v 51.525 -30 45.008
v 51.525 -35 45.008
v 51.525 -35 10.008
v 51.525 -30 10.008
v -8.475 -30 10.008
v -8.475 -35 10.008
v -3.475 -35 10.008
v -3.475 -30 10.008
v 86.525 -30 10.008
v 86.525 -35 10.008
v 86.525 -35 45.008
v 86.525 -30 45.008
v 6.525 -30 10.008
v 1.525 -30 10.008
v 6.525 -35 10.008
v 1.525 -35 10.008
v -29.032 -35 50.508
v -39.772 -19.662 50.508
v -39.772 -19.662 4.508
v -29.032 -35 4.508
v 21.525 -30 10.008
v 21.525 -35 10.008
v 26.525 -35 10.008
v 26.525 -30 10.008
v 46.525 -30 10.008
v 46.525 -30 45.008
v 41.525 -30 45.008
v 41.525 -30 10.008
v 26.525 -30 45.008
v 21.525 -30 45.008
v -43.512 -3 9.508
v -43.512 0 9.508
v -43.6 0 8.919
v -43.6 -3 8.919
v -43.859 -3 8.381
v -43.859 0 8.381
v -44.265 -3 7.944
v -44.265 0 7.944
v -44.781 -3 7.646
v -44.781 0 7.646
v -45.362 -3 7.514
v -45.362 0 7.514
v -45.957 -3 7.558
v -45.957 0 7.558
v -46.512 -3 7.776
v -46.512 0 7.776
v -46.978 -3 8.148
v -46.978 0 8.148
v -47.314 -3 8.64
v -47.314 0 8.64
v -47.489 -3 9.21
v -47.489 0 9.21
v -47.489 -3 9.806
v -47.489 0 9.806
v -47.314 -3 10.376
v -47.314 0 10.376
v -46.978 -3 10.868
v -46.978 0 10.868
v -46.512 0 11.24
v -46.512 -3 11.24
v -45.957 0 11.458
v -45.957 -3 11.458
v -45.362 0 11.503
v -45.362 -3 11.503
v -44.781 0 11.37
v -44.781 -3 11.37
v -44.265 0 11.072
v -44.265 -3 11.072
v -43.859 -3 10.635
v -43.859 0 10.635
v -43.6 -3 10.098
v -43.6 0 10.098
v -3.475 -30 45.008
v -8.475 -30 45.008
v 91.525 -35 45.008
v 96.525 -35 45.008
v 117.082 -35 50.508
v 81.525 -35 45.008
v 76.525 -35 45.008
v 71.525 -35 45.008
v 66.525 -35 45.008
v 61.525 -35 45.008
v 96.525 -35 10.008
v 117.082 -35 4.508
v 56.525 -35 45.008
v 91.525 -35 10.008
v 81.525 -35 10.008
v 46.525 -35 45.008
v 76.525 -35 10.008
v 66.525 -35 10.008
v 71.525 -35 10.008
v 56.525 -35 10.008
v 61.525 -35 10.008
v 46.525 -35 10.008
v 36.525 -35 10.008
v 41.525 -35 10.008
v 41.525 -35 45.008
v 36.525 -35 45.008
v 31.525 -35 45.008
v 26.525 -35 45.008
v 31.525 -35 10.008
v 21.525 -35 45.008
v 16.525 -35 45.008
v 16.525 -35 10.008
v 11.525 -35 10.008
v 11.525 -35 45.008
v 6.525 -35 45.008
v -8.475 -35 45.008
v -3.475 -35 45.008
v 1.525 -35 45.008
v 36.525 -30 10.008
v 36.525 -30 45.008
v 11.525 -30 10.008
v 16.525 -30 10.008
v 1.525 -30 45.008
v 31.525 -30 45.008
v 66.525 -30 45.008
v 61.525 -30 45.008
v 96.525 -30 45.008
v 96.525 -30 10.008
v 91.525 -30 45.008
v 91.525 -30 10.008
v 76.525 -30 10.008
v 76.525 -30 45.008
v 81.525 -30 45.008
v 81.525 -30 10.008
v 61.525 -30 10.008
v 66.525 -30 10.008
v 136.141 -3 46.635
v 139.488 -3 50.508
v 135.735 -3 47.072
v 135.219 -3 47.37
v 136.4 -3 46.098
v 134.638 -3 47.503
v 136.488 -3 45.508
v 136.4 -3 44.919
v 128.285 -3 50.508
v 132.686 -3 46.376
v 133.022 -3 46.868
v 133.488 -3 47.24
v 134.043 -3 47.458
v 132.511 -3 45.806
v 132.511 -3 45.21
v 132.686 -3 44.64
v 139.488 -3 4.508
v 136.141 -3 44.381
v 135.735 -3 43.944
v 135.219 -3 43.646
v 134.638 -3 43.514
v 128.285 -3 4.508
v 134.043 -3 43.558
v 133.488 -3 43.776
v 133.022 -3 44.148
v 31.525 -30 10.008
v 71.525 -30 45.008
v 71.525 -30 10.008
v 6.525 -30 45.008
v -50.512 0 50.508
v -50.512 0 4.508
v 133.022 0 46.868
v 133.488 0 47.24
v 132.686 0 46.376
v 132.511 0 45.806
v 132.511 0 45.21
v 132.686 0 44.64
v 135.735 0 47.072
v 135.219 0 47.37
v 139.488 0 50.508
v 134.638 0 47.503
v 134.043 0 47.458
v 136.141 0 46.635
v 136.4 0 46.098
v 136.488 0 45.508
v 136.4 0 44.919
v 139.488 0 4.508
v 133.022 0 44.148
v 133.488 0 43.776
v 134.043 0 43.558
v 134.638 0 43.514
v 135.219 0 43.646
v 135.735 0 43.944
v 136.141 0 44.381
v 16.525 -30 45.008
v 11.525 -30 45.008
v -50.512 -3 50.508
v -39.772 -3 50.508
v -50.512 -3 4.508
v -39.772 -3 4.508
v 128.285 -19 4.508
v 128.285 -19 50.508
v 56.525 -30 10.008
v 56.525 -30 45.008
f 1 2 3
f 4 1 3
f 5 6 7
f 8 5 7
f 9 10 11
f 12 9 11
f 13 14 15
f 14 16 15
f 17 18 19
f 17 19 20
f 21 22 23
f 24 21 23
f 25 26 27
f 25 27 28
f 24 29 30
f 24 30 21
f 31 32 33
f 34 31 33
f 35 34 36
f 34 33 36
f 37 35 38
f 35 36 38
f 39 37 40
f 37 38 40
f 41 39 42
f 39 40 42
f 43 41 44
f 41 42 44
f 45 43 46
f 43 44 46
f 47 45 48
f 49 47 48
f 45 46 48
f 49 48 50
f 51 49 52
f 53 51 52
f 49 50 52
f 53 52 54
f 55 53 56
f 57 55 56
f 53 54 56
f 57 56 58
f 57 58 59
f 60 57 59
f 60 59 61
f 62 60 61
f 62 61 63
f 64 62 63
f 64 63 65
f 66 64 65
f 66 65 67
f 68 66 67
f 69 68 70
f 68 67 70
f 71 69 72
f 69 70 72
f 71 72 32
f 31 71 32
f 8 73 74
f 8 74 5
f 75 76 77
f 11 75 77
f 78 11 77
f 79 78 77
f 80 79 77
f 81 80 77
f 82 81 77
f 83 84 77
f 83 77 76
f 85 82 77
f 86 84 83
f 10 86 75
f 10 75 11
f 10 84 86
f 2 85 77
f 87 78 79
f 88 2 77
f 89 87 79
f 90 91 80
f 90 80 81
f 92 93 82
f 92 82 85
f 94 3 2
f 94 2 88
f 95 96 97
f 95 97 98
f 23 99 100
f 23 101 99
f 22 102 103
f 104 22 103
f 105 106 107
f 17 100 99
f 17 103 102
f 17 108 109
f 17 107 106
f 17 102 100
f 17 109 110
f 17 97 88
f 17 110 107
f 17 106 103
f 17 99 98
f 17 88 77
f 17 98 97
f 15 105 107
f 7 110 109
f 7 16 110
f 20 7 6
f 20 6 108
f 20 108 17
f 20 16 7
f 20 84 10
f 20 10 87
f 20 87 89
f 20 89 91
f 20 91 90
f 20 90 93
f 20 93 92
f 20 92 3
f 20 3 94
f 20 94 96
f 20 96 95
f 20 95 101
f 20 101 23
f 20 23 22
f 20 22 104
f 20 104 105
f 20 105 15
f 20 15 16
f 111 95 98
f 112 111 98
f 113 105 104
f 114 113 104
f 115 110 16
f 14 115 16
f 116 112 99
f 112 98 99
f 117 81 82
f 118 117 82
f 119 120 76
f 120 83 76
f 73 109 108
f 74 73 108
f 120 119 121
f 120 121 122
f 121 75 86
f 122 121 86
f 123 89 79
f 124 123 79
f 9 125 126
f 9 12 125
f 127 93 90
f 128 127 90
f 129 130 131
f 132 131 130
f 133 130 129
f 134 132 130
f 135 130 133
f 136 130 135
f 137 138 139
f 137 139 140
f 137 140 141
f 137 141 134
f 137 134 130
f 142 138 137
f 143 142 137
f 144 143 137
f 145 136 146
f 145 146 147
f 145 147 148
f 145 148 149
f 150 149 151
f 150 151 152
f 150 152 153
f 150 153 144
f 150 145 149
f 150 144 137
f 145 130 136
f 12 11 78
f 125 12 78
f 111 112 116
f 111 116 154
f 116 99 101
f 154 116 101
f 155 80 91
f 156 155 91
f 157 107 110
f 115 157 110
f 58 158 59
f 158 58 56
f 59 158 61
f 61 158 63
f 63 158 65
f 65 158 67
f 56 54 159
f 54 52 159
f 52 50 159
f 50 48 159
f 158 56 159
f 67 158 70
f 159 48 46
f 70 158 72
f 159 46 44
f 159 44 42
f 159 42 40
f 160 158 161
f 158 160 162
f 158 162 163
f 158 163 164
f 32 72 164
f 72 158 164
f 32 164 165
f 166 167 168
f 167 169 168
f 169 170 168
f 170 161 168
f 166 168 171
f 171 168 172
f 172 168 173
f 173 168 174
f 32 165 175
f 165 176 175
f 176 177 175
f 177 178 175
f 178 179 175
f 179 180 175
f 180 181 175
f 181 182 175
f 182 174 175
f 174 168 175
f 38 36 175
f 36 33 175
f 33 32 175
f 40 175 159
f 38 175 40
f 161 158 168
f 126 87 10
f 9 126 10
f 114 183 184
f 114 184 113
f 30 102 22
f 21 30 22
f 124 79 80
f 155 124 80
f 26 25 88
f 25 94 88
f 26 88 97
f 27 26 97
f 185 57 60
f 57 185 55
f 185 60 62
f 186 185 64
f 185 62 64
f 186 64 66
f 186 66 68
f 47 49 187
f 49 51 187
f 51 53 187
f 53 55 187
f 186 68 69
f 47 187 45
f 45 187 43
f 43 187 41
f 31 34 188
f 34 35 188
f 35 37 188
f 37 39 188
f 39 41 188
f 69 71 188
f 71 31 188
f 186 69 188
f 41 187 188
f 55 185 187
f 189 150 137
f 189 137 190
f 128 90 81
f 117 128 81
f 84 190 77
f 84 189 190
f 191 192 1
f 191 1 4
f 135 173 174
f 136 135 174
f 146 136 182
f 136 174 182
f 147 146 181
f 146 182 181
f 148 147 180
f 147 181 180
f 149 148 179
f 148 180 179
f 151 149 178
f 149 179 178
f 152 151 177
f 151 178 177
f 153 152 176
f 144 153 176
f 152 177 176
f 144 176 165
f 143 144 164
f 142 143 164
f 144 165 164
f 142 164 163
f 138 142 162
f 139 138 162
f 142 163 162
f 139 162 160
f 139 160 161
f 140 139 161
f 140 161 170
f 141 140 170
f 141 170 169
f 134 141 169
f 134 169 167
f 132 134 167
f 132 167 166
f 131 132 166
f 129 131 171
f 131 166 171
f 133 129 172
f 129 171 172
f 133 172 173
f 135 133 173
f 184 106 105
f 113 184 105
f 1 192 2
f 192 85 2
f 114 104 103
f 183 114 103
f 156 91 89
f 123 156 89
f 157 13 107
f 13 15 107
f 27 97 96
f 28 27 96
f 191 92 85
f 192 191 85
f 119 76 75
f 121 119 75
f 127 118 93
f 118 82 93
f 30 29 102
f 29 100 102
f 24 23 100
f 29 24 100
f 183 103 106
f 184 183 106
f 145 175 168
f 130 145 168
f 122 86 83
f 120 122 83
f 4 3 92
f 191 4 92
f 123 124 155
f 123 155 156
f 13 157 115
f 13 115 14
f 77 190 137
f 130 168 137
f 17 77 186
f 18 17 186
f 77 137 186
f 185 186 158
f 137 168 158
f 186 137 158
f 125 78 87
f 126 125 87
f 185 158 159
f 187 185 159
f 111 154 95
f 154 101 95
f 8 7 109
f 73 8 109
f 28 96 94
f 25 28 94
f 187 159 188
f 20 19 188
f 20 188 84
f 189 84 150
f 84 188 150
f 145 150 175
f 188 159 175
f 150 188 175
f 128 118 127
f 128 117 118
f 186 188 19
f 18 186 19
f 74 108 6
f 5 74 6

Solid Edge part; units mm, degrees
sketch "Sketch1" plane through (0, 0, 0) normal (0, -1, 0) x (1, 0, 0)
  line L0 (-50.5116, 4.5081) -> (139.4884, 4.5081)
  line L1 (139.4884, 4.5081) -> (139.4884, 50.5081)
  line L2 (139.4884, 50.5081) -> (-50.5116, 50.5081)
  line L3 (-50.5116, 50.5081) -> (-50.5116, 4.5081)
  circle A0 centre (-45.5116, 9.5081) radius 2
  circle A1 centre (134.4884, 45.5081) radius 2
  dimension "D1" = 5
  dimension "D2" = 5
  dimension "D3" = 5
  dimension "D4" = 5
extrude "Protrusion1" add sketch "Sketch1" along normal blind 35
sketch "Sketch2" plane through (44.4884, -17.5, 4.5081) normal (0, 0, -1) x (1, 0, 0)
  line L0 (-95, -17.5) -> (-95, -14.5)
  line L1 (-95, -14.5) -> (-84.26, -14.5)
  line L2 (-84.26, -14.5) -> (-84.26, 2.1617)
  line L3 (-84.26, 2.1617) -> (-73.52, 17.5)
  line L4 (72.5934, 17.5) -> (-73.52, 17.5)
  line L5 (83.7967, 1.5) -> (72.5934, 17.5)
  line L6 (83.7967, -14.5) -> (83.7967, 1.5)
  line L7 (95, -14.5) -> (83.7967, -14.5)
  line L8 (95, -17.5) -> (95, -14.5)
  line L9 (100.6753, -17.5) -> (95, -17.5)
  line L10 (100.6753, 23.6883) -> (100.6753, -17.5)
  line L11 (-100.9714, 23.6883) -> (100.6753, 23.6883)
  line L12 (-100.9714, -17.5) -> (-100.9714, 23.6883)
  line L13 (-95, -17.5) -> (-100.9714, -17.5)
extrude "ExtrudedCutout_1" cut sketch "Sketch2" against normal blind 46
sketch "Sketch3" plane through (44.025, -35, 27.5081) normal (0, -1, 0) x (1, 0, 0)
  line L0 (-2.5, -17.5) -> (2.5, -17.5)
  line L1 (2.5, -17.5) -> (2.5, 17.5)
  line L2 (2.5, 17.5) -> (-2.5, 17.5)
  line L3 (-2.5, 17.5) -> (-2.5, -17.5)
  line L4 (7.5, -17.5) -> (12.5, -17.5)
  line L5 (12.5, -17.5) -> (12.5, 17.5)
  line L6 (12.5, 17.5) -> (7.5, 17.5)
  line L7 (7.5, 17.5) -> (7.5, -17.5)
  line L8 (17.5, -17.5) -> (22.5, -17.5)
  line L9 (22.5, -17.5) -> (22.5, 17.5)
  line L10 (22.5, 17.5) -> (17.5, 17.5)
  line L11 (17.5, 17.5) -> (17.5, -17.5)
  line L12 (27.5, -17.5) -> (32.5, -17.5)
  line L13 (32.5, -17.5) -> (32.5, 17.5)
  line L14 (32.5, 17.5) -> (27.5, 17.5)
  line L15 (27.5, 17.5) -> (27.5, -17.5)
  line L16 (37.5, -17.5) -> (42.5, -17.5)
  line L17 (42.5, -17.5) -> (42.5, 17.5)
  line L18 (42.5, 17.5) -> (37.5, 17.5)
  line L19 (37.5, 17.5) -> (37.5, -17.5)
  line L20 (-12.5, -17.5) -> (-7.5, -17.5)
  line L21 (-7.5, -17.5) -> (-7.5, 17.5)
  line L22 (-7.5, 17.5) -> (-12.5, 17.5)
  line L23 (-12.5, 17.5) -> (-12.5, -17.5)
  line L24 (-22.5, -17.5) -> (-17.5, -17.5)
  line L25 (-17.5, -17.5) -> (-17.5, 17.5)
  line L26 (-17.5, 17.5) -> (-22.5, 17.5)
  line L27 (-22.5, 17.5) -> (-22.5, -17.5)
  line L28 (-32.5, -17.5) -> (-27.5, -17.5)
  line L29 (-27.5, -17.5) -> (-27.5, 17.5)
  line L30 (-27.5, 17.5) -> (-32.5, 17.5)
  line L31 (-32.5, 17.5) -> (-32.5, -17.5)
  line L32 (-42.5, -17.5) -> (-37.5, -17.5)
  line L33 (-37.5, -17.5) -> (-37.5, 17.5)
  line L34 (-37.5, 17.5) -> (-42.5, 17.5)
  line L35 (-42.5, 17.5) -> (-42.5, -17.5)
  line L36 (-52.5, -17.5) -> (-47.5, -17.5)
  line L37 (-47.5, -17.5) -> (-47.5, 17.5)
  line L38 (-47.5, 17.5) -> (-52.5, 17.5)
  line L39 (-52.5, 17.5) -> (-52.5, -17.5)
  line L40 (47.5, -17.5) -> (52.5, -17.5)
  line L41 (52.5, -17.5) -> (52.5, 17.5)
  line L42 (52.5, 17.5) -> (47.5, 17.5)
  line L43 (47.5, 17.5) -> (47.5, -17.5)
extrude "ExtrudedCutout_2" cut sketch "Sketch3" against normal blind 5
